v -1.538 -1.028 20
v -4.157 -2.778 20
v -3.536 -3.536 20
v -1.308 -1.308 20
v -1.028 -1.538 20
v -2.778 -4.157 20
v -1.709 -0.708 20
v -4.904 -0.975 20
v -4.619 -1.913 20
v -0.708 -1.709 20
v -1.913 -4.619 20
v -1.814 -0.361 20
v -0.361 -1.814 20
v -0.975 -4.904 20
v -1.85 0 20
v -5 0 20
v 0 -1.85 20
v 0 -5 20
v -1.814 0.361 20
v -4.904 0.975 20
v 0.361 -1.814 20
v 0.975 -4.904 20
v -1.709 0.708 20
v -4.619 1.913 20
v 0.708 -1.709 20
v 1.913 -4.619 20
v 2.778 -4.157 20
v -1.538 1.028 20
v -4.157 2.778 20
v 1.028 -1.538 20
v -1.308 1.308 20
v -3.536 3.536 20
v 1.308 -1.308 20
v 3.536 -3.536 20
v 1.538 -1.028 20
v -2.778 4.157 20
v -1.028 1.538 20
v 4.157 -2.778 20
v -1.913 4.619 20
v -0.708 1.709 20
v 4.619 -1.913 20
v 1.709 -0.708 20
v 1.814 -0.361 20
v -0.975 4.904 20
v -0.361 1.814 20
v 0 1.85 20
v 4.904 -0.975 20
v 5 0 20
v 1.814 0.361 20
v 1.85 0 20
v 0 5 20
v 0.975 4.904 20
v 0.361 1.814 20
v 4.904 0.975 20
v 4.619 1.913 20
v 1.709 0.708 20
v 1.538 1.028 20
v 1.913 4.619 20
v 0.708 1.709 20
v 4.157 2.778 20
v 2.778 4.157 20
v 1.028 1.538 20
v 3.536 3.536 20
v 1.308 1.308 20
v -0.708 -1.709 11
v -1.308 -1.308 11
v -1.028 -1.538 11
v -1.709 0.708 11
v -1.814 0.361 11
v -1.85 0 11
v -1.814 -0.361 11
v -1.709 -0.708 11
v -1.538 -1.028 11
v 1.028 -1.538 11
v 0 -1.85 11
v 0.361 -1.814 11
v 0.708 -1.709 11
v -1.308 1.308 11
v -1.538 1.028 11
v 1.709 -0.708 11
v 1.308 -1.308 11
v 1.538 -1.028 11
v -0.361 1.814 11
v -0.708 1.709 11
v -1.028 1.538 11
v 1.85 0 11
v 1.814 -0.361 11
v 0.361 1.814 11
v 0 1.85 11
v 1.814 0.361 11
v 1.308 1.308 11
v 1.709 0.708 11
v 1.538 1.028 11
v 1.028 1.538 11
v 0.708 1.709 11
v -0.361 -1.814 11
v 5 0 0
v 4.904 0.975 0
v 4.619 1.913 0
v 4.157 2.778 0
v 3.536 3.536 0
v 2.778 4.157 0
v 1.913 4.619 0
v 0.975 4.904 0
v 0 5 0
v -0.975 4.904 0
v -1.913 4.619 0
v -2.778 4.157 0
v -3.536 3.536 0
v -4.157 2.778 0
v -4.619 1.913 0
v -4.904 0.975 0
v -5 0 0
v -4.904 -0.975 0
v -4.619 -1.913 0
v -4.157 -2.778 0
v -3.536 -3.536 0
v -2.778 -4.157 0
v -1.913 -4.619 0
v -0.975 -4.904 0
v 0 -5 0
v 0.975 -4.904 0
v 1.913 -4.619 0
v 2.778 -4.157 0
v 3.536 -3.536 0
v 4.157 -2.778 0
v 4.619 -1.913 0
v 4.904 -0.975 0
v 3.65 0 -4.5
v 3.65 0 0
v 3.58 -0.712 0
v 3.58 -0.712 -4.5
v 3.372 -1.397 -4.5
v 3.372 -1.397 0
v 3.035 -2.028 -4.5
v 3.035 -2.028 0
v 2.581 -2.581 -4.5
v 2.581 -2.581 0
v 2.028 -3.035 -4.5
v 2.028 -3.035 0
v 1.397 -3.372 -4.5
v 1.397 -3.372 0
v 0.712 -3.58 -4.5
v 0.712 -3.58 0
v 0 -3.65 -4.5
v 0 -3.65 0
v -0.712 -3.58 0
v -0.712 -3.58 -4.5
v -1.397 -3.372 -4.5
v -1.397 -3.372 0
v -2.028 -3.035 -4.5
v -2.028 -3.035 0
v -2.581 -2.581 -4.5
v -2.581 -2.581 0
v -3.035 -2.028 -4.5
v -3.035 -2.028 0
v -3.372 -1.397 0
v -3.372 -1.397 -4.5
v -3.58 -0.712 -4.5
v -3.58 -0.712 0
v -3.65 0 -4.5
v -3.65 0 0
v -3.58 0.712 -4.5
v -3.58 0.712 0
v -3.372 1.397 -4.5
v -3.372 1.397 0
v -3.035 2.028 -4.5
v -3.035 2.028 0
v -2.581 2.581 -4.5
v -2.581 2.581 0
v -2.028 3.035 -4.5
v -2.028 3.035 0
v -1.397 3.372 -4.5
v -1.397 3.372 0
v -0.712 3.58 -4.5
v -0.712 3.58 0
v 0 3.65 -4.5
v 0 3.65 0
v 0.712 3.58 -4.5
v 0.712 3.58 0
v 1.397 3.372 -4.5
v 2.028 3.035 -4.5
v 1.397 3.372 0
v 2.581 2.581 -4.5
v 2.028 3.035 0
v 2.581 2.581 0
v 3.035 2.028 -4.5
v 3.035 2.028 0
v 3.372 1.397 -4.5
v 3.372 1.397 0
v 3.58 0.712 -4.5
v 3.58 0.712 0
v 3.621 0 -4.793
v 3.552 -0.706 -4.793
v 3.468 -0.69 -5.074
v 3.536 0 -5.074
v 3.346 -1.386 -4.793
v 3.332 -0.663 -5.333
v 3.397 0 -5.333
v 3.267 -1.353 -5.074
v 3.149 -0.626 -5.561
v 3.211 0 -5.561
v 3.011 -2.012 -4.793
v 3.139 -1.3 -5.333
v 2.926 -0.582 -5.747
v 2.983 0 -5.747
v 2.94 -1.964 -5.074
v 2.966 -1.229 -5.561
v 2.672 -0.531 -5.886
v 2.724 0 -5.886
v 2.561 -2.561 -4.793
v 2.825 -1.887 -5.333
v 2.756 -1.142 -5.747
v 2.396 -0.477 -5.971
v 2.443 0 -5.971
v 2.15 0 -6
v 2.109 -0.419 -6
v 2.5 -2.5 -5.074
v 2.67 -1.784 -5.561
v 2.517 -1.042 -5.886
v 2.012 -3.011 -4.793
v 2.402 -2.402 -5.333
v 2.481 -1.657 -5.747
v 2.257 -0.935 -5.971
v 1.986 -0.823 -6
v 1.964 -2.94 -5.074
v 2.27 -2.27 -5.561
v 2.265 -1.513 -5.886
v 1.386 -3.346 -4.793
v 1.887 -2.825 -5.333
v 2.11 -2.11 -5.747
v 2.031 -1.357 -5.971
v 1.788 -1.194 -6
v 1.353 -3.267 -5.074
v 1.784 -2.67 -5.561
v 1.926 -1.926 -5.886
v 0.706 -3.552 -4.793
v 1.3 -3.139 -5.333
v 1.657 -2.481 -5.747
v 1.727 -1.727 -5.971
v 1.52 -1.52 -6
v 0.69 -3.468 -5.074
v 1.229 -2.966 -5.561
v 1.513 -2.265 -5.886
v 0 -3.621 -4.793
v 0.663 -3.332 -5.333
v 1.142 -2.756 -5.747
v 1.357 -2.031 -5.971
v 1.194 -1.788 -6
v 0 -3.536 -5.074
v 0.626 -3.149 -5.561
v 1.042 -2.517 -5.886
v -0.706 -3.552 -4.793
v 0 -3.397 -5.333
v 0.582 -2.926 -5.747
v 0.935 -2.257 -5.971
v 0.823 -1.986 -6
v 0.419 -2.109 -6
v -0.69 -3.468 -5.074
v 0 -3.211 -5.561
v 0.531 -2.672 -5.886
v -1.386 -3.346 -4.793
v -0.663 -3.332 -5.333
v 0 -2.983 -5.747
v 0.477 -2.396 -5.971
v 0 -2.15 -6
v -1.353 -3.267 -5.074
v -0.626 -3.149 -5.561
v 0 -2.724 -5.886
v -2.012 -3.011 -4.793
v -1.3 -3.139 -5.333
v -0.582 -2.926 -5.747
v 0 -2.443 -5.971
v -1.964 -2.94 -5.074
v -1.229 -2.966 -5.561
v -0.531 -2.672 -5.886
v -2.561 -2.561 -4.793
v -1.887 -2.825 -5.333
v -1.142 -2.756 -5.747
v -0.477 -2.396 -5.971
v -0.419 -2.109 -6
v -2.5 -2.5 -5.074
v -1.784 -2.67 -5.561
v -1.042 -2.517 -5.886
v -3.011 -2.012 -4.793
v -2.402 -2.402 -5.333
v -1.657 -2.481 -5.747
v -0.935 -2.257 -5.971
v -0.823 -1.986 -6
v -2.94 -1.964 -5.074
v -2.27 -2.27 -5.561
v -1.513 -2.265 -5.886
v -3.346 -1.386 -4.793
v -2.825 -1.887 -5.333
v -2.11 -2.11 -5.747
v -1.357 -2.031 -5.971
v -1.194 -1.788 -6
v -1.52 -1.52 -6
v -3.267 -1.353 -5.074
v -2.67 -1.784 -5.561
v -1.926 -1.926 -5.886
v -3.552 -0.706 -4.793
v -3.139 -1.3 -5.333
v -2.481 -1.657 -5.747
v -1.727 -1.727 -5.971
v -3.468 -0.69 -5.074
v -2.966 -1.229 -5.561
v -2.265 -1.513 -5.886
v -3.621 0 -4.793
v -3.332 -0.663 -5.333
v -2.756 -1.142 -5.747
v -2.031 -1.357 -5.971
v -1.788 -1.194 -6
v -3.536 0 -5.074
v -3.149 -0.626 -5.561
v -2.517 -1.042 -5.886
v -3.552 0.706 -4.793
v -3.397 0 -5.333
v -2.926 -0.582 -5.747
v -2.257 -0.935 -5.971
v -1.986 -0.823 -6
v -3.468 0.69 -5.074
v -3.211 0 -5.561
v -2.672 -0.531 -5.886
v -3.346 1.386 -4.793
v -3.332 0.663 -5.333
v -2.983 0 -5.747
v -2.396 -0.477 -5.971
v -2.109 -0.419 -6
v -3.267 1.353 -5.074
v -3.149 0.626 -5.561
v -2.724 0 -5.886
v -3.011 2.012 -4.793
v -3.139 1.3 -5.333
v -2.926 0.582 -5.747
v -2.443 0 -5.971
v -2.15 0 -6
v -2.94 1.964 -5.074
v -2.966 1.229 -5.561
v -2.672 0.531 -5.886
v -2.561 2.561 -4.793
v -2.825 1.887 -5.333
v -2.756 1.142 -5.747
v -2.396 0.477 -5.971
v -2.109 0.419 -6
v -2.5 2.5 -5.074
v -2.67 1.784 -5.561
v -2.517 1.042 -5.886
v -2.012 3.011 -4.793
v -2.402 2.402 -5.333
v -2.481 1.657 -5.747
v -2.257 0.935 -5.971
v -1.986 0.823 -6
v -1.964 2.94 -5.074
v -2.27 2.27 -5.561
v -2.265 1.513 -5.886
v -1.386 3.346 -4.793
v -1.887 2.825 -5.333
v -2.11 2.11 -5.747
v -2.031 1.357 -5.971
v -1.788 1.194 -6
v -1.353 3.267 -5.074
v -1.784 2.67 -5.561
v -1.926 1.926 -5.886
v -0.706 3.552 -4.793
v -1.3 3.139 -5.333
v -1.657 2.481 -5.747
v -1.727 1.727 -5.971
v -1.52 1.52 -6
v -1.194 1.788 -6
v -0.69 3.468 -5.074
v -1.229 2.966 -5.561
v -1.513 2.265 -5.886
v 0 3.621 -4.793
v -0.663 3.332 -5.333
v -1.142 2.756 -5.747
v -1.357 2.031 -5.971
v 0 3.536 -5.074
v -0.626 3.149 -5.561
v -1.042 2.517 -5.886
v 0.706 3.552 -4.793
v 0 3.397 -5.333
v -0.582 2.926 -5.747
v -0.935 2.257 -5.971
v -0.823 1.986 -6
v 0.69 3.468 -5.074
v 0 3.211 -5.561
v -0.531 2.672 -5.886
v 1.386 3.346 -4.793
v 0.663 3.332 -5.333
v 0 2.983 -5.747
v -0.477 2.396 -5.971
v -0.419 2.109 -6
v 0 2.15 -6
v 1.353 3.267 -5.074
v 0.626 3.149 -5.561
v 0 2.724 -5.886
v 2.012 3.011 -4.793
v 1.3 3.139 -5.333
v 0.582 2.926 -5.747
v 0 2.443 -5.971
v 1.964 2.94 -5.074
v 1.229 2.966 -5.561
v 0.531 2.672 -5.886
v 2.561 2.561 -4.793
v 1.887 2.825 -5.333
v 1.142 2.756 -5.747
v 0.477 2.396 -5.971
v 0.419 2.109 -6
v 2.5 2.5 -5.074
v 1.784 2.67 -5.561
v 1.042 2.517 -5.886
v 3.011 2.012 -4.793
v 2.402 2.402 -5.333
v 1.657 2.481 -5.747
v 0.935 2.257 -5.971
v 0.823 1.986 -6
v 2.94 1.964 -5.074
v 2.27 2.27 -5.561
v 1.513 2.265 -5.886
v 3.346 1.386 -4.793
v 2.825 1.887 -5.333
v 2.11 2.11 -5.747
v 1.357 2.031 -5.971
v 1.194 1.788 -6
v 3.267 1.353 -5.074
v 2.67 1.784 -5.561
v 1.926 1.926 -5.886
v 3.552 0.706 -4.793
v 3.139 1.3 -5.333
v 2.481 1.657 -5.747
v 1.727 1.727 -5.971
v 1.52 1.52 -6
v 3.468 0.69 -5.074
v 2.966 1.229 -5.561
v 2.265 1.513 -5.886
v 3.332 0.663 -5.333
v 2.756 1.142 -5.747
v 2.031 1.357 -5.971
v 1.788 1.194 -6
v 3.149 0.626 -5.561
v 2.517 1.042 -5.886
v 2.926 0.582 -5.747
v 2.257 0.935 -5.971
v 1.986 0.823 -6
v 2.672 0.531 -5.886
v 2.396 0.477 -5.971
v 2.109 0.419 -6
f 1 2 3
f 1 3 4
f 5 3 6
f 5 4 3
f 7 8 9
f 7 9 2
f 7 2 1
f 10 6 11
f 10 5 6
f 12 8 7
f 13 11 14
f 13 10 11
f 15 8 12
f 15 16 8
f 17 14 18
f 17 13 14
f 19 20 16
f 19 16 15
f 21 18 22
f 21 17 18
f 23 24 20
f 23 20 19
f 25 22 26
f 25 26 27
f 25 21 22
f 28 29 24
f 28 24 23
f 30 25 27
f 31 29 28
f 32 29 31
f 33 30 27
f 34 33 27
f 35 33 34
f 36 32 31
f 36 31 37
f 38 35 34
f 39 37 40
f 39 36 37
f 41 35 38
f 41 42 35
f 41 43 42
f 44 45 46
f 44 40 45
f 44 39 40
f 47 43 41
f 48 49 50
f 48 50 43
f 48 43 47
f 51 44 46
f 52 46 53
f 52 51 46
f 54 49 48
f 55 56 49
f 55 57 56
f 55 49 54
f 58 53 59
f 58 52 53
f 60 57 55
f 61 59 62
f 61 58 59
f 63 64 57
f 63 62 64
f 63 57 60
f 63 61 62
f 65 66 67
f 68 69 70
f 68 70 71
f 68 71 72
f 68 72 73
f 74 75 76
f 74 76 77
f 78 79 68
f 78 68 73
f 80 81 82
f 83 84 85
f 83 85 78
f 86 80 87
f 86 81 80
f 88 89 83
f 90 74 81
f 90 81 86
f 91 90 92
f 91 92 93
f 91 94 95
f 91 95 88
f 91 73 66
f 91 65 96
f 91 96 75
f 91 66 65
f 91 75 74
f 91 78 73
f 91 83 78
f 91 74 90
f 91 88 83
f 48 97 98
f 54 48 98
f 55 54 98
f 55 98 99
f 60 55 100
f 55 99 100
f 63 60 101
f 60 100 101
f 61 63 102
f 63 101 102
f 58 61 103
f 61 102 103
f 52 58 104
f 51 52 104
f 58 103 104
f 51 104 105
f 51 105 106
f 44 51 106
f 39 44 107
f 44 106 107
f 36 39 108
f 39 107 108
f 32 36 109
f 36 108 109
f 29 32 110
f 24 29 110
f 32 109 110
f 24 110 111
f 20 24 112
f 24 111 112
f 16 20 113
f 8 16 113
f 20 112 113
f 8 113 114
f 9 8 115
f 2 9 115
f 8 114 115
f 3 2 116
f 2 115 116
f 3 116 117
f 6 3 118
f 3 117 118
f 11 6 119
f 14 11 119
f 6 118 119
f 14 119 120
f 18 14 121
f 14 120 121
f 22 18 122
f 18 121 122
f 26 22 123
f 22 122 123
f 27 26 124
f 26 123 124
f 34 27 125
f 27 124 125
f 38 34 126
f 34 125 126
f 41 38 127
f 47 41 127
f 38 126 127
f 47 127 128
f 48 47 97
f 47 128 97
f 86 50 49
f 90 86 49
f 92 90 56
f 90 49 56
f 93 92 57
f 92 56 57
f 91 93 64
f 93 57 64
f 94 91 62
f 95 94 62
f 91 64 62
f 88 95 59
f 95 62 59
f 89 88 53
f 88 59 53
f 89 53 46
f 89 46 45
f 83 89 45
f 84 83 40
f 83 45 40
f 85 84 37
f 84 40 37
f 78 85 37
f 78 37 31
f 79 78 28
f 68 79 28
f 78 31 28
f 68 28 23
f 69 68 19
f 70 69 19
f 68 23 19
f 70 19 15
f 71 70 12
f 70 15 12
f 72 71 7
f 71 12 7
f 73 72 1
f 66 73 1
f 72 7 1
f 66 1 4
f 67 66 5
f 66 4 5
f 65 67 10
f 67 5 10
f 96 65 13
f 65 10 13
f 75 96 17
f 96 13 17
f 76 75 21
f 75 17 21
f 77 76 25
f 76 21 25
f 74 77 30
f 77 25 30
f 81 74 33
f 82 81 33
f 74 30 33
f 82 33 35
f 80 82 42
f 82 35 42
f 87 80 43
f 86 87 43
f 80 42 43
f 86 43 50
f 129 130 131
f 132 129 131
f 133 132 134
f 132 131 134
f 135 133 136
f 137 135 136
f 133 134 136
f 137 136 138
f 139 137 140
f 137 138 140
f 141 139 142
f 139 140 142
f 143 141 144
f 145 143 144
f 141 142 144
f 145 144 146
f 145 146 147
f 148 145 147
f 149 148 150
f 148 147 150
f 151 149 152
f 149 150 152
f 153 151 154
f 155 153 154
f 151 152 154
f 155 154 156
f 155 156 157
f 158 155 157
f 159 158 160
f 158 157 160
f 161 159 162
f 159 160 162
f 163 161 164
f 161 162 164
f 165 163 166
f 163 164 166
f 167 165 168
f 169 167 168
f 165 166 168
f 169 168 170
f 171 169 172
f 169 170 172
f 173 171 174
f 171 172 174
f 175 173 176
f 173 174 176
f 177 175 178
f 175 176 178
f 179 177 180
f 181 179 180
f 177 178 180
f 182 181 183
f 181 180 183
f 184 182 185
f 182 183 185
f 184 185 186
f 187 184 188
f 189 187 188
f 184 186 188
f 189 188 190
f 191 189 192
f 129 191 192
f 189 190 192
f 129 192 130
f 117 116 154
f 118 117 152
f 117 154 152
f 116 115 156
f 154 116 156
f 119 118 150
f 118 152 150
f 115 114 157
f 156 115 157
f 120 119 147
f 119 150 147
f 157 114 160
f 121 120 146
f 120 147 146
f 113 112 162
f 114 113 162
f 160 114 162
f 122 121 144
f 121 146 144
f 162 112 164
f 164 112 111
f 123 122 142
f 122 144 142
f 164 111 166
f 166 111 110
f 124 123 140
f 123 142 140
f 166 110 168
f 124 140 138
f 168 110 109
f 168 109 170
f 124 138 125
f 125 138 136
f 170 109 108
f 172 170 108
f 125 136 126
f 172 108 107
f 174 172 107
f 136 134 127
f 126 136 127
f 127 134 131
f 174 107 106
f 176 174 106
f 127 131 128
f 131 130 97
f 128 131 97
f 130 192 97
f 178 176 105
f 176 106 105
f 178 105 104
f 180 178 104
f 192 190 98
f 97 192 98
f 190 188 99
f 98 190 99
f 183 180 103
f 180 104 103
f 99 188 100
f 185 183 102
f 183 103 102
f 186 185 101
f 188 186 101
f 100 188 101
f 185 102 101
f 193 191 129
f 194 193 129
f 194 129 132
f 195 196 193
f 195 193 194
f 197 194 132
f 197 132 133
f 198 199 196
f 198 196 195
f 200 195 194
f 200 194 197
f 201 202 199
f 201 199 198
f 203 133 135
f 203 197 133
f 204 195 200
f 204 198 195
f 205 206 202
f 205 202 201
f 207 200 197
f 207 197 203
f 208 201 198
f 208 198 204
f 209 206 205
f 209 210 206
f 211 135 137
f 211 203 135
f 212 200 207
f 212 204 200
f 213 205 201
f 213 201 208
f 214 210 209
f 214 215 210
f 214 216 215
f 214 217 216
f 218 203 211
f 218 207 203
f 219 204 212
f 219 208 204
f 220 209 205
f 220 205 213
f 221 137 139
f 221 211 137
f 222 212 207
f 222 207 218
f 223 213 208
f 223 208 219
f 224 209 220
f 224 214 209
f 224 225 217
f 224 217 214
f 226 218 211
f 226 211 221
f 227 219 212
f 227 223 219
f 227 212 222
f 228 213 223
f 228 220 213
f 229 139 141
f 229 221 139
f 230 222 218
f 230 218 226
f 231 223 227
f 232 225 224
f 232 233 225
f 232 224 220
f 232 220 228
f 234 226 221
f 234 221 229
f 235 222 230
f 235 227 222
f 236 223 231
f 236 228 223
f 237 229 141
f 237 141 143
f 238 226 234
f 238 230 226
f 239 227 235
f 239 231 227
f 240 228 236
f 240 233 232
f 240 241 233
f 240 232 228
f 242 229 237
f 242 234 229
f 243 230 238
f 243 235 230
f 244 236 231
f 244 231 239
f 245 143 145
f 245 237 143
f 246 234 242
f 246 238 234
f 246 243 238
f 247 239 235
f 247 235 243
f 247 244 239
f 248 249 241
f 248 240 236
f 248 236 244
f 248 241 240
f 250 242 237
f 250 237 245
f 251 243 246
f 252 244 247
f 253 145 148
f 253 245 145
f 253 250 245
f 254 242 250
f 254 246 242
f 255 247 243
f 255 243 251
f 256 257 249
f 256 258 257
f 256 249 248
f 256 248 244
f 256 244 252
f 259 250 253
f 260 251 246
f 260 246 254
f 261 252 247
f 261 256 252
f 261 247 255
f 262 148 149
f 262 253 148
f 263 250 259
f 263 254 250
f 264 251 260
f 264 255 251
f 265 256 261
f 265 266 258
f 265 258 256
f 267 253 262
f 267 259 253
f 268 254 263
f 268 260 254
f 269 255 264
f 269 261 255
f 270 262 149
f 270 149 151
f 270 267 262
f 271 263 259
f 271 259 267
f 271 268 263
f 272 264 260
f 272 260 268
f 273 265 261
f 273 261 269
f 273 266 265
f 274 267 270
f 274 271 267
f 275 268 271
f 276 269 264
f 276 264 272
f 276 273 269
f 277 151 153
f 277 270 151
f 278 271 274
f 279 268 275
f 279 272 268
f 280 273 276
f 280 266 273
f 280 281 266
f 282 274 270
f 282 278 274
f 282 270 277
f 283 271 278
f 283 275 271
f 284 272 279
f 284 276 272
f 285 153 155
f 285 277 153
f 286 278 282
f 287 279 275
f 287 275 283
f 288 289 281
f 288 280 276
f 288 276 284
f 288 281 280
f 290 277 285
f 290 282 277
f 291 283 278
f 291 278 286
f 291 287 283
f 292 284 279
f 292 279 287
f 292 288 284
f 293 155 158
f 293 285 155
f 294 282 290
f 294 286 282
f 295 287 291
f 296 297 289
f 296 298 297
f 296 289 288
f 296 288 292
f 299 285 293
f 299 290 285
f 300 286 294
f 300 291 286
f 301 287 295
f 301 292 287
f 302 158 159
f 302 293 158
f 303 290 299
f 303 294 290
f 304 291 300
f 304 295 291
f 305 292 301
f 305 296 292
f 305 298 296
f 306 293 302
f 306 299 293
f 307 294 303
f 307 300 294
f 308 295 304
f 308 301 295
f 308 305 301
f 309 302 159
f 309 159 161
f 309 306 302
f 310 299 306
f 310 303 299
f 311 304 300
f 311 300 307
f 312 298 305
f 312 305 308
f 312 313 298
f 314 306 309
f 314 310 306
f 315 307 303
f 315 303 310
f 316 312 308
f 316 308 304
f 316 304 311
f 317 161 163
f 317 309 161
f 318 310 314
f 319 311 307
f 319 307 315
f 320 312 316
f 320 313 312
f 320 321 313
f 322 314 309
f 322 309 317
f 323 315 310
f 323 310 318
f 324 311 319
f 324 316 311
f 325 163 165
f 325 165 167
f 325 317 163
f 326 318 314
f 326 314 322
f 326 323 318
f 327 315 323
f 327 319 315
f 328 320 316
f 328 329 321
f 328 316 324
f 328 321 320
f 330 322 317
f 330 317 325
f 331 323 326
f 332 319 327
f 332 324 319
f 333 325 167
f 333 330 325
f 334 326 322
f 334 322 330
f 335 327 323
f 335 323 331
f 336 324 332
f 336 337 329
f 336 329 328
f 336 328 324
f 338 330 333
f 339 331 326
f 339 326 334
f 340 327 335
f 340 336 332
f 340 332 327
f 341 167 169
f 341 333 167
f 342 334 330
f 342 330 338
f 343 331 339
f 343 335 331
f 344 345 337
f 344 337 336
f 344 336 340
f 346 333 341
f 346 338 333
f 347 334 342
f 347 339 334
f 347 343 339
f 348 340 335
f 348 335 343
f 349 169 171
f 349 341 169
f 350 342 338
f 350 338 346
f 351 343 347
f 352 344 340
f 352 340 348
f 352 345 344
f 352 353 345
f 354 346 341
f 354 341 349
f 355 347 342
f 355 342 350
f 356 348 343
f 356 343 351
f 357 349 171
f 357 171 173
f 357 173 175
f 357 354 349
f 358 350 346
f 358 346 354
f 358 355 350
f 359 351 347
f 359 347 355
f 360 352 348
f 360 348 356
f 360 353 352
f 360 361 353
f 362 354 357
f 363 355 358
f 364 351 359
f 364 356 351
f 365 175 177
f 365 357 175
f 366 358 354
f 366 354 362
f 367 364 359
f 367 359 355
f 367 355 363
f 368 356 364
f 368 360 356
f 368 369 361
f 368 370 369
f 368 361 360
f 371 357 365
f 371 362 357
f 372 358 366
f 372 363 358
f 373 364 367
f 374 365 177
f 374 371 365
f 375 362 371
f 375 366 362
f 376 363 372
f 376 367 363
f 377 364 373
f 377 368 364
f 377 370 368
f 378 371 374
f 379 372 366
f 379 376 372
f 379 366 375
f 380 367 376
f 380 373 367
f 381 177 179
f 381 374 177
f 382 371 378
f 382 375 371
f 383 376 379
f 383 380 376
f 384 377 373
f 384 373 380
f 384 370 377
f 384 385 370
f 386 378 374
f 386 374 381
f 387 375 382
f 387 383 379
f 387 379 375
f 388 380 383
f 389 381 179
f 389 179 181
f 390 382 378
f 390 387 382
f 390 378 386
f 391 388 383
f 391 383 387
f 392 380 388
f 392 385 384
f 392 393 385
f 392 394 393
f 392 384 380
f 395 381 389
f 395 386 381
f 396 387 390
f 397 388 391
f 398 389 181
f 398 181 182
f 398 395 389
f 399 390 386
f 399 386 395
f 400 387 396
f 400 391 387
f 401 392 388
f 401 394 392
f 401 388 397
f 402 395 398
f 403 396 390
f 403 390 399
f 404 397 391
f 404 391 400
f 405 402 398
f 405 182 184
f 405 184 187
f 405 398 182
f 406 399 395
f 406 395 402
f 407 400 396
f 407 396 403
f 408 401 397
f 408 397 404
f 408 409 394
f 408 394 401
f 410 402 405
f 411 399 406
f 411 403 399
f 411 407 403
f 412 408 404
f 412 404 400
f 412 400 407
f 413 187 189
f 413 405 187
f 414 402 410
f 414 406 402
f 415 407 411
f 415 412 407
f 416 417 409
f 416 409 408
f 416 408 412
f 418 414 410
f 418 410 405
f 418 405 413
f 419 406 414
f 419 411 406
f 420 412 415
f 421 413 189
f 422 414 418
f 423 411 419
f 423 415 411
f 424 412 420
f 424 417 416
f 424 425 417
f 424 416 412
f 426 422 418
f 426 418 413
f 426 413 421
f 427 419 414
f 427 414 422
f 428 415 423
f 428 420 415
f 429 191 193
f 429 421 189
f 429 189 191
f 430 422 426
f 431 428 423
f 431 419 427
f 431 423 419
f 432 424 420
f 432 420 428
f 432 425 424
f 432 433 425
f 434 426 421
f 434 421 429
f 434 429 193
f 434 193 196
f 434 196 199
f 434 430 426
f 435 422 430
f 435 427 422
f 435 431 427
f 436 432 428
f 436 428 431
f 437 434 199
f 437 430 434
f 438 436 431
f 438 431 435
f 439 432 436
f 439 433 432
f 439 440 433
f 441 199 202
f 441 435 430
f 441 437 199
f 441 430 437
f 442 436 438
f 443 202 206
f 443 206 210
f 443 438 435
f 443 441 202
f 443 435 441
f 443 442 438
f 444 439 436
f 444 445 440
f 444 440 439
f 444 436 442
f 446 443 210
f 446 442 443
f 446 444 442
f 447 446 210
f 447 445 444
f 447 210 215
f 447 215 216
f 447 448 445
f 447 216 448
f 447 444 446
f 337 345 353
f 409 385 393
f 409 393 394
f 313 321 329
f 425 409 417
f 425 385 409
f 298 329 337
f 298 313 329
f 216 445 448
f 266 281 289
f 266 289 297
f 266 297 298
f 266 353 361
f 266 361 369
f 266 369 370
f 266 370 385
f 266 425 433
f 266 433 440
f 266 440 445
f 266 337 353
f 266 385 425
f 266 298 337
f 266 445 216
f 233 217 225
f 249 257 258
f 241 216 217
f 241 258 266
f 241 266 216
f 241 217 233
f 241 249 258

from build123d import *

# Parameters (mm, degrees)
SKETCH_R     = 5
PAD_DEPTH    = 20
SKETCH001_R  = 1.85
POCKET_DEPTH = 9
SKETCH002_R  = 3.65
PAD001_DEPTH = 6
FILLET_R     = 1.5


with BuildPart() as part:
    # Sketch → Pad (new body)
    with BuildSketch(Plane.XY):
        Circle(SKETCH_R)
    extrude(amount=PAD_DEPTH)

    # Sketch001 (on Face3 of Pad) → Pocket (cut)
    with BuildSketch(Plane.XY.offset(20)):
        Circle(SKETCH001_R)
    extrude(amount=-POCKET_DEPTH, mode=Mode.SUBTRACT)

    # Sketch002 (on Face2 of Pocket) → Pad001 (join)
    with BuildSketch(Plane(origin=(0, 0, 0), x_dir=(1, 0, 0), z_dir=(0, 0, -1))):
        Circle(SKETCH002_R)
    extrude(amount=PAD001_DEPTH)

    # Fillet
    fillet_edges = [part.edges().sort_by_distance(p)[0] for p in [
        (-3.65, 0, -6),
    ]]
    fillet(fillet_edges, radius=FILLET_R)


solid = part.part
